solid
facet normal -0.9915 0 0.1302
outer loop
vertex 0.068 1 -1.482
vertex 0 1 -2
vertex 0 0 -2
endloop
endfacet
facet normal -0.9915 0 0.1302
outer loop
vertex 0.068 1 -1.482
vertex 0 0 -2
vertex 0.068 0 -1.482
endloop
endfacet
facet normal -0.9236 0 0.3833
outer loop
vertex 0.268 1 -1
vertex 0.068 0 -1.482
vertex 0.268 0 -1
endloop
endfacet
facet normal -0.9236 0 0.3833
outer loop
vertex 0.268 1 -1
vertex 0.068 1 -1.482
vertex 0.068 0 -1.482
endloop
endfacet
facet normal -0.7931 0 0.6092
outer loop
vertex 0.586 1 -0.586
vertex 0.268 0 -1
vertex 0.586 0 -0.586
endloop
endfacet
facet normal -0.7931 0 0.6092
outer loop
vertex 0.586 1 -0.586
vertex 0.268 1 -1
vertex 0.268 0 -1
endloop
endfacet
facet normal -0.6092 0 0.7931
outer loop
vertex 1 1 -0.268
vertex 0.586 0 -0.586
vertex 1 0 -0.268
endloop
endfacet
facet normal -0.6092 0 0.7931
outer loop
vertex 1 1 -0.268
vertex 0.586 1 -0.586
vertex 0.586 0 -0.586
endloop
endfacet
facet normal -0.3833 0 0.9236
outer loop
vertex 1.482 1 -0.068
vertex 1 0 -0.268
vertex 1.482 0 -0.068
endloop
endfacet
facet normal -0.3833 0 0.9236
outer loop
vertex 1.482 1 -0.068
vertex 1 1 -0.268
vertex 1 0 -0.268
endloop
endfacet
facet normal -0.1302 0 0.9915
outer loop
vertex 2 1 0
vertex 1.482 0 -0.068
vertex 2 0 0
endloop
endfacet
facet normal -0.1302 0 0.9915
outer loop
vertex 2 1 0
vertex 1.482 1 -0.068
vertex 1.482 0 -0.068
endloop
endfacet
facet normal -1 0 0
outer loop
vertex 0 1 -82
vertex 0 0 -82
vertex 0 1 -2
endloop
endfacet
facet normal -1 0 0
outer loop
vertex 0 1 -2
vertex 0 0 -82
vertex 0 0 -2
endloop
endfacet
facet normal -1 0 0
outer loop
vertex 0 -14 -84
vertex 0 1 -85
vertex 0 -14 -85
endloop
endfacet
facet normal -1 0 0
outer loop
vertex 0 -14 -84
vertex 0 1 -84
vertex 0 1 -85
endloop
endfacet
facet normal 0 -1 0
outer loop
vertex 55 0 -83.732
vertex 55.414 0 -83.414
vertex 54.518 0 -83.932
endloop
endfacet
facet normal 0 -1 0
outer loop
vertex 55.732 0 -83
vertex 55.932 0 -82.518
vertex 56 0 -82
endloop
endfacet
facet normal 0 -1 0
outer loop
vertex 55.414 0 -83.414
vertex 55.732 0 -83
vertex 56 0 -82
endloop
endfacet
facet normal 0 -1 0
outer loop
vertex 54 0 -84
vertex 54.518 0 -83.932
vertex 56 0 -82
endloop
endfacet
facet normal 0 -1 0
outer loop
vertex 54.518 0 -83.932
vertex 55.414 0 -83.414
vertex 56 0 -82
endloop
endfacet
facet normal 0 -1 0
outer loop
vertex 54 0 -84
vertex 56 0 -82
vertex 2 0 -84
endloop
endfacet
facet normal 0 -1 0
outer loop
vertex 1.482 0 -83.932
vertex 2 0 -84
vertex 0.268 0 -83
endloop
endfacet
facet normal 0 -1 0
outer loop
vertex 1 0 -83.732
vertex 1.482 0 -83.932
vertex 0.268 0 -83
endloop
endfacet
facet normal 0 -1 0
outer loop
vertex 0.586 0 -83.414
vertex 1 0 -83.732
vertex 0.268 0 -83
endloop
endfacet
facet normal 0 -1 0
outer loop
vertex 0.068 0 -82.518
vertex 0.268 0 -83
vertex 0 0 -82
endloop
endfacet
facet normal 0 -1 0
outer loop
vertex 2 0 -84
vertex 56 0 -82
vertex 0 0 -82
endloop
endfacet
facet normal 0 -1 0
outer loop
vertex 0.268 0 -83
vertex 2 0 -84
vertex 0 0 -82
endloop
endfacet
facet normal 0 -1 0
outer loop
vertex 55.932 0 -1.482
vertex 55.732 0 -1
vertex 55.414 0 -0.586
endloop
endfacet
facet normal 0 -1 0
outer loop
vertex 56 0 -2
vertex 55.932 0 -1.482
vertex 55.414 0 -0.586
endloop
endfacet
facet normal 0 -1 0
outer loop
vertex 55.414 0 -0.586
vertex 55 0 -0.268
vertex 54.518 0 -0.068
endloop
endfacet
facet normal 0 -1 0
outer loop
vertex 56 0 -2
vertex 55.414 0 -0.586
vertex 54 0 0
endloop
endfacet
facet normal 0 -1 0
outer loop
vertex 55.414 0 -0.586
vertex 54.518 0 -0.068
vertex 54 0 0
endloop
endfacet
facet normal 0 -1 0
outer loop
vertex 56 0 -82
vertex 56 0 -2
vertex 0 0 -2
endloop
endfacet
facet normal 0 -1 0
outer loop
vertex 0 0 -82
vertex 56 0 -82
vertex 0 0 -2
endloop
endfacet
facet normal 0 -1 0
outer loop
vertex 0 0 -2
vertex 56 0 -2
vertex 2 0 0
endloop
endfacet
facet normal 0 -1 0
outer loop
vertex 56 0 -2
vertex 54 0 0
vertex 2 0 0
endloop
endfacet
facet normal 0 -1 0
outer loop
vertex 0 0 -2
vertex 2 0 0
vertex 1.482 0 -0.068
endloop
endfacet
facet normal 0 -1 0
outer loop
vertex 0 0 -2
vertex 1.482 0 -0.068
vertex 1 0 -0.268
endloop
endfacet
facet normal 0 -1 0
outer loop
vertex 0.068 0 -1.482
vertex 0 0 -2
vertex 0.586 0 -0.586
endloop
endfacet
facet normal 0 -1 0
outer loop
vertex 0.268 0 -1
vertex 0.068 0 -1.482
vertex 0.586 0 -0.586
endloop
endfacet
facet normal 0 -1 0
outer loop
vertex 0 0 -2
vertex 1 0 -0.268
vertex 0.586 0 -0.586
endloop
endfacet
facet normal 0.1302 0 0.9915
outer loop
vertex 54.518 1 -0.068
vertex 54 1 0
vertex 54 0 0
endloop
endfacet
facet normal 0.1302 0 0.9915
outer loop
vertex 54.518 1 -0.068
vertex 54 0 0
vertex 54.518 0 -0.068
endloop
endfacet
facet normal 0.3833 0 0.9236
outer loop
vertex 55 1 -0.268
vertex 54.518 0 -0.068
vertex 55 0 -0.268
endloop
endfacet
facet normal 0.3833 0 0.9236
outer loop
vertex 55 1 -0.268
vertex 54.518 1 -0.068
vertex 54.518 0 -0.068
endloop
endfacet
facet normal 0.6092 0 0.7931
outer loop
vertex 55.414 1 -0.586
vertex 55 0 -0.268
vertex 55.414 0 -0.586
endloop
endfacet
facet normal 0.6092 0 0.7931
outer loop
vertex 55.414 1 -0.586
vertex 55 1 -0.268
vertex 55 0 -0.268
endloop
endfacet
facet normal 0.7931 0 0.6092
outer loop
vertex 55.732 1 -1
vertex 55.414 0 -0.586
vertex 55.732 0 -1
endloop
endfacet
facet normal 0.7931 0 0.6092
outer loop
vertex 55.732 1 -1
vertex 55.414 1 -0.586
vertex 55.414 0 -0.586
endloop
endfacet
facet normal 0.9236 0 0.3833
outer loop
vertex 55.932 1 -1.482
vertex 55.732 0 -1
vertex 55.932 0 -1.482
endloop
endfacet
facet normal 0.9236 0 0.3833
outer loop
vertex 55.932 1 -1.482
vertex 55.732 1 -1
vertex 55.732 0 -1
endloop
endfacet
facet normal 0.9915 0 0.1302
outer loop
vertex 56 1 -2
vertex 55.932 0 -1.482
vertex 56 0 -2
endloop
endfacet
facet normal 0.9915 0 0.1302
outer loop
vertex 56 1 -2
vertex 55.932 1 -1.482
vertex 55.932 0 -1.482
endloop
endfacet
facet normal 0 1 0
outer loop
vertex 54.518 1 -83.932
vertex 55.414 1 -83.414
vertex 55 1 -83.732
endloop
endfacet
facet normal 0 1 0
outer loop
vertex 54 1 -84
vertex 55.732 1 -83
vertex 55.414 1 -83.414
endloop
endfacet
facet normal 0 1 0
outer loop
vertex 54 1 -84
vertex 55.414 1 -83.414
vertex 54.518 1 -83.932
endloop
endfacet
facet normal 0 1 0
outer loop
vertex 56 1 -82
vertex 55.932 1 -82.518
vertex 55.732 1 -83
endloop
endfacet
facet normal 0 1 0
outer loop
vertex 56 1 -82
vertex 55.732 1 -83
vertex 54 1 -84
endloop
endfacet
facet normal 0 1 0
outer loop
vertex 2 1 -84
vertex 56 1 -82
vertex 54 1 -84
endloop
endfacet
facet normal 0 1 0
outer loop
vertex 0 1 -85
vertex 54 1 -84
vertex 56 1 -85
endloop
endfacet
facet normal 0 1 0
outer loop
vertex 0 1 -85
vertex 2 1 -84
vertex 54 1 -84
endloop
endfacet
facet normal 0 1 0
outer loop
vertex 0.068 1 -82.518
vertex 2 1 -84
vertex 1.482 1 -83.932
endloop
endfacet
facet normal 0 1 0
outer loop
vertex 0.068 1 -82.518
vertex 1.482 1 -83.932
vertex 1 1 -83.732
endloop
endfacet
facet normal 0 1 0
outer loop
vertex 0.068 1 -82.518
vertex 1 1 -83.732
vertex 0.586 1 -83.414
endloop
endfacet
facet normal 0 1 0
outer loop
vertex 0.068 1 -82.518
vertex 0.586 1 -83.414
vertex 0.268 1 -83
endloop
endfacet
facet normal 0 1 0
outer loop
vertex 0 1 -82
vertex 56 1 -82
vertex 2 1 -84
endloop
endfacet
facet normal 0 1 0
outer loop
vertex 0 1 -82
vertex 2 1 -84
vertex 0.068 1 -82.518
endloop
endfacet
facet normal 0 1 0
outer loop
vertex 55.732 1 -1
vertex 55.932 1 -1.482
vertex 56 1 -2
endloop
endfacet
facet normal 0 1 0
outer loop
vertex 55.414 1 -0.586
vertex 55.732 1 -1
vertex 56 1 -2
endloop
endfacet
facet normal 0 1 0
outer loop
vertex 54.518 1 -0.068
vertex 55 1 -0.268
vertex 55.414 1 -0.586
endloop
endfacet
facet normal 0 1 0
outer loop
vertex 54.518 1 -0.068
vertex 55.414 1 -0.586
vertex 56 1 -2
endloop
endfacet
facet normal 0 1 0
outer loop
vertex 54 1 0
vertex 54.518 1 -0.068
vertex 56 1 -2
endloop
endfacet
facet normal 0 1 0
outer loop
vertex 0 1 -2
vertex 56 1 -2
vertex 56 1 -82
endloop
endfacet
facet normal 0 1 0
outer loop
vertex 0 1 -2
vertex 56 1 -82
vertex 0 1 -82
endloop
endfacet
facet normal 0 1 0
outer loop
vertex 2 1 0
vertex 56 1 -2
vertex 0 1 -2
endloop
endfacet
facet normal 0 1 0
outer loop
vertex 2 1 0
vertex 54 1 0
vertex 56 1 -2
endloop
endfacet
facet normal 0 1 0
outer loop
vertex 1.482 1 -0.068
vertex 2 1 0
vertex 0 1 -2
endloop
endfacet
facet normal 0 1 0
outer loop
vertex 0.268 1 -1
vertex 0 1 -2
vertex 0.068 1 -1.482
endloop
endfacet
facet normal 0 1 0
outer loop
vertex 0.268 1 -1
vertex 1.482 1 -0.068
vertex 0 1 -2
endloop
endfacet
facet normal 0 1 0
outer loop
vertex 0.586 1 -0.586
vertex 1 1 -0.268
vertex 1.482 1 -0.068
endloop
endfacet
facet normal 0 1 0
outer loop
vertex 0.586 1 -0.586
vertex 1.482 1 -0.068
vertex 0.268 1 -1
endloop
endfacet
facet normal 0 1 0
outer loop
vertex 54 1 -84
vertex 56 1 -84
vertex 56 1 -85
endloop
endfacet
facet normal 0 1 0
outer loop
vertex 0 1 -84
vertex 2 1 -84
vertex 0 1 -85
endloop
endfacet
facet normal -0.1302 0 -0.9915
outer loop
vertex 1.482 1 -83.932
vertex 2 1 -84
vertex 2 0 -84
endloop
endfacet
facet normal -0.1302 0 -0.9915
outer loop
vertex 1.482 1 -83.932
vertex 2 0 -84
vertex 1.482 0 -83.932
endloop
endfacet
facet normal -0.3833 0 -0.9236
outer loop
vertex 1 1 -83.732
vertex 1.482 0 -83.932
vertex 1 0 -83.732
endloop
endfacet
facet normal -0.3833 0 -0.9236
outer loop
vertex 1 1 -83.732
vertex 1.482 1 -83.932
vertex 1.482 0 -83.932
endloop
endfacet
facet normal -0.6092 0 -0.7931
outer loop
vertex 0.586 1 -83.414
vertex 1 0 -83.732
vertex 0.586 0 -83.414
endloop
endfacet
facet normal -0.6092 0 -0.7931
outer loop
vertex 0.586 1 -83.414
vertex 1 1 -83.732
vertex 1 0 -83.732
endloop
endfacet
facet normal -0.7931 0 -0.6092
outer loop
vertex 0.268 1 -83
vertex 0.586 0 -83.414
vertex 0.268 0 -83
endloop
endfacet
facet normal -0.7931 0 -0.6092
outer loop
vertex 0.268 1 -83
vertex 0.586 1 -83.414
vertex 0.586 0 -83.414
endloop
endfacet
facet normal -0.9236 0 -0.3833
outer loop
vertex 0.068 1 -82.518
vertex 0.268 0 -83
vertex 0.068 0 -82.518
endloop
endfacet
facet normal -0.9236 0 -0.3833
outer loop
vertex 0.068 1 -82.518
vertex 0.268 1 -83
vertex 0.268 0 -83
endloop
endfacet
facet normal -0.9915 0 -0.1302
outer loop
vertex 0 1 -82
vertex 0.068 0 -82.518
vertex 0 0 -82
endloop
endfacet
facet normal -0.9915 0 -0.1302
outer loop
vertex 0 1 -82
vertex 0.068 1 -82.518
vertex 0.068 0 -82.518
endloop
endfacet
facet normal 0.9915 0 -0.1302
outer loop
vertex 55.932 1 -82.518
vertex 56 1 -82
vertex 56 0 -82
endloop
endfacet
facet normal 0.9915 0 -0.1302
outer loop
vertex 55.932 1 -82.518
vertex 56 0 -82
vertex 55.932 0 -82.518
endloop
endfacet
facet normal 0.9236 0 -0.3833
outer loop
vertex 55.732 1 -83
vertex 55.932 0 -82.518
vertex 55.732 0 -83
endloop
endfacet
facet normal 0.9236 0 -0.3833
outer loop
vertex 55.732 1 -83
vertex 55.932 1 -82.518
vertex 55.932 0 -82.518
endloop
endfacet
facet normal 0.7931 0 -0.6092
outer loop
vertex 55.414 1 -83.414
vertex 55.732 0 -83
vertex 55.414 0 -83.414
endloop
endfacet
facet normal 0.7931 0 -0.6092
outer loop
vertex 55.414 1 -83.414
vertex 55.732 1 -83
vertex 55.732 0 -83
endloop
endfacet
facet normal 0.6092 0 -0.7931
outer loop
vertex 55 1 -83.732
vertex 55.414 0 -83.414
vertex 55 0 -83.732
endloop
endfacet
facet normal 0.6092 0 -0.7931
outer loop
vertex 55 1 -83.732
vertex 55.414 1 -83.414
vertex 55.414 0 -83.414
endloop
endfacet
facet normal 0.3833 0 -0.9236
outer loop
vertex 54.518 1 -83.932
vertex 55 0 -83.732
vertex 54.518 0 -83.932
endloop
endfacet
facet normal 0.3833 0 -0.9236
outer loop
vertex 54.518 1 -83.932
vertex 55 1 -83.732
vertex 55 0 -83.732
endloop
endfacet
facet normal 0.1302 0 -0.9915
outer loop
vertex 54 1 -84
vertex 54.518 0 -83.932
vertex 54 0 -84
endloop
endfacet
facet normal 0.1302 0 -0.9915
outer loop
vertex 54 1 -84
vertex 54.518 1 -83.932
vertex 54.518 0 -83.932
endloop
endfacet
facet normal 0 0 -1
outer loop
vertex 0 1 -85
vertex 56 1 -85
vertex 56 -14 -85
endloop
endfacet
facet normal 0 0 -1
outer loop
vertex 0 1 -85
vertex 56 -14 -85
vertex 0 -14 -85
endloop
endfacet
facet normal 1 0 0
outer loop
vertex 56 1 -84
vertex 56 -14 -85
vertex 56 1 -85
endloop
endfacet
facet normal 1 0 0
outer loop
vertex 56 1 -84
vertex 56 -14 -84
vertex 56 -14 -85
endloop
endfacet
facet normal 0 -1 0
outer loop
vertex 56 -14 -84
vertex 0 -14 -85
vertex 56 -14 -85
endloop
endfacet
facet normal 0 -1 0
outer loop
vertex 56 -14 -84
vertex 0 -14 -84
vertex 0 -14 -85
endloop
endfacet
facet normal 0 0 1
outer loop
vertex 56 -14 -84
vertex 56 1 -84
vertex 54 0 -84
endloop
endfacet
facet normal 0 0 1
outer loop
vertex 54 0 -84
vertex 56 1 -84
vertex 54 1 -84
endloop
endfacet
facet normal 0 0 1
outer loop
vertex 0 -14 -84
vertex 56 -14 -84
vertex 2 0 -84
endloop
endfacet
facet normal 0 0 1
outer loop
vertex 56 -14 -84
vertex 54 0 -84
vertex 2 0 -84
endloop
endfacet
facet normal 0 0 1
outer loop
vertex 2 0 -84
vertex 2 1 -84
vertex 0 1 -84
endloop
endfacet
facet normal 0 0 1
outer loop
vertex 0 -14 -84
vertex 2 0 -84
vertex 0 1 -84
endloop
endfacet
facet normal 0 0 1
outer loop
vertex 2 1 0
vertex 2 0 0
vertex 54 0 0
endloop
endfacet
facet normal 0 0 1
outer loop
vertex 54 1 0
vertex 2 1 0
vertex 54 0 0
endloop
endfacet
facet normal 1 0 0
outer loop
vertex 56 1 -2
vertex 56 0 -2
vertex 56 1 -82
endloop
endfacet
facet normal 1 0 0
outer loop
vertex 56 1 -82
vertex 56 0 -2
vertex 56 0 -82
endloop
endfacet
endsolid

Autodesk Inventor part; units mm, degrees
ref_plane "YZ Plane" through (0, 0, 0) normal (1, 0, 0) x (0, 1, 0)
ref_plane "XZ Plane" through (0, 0, 0) normal (0, 1, 0) x (-1, 0, 0)
sketch "Sketch1" plane through (0, 0, 0) normal (0, 1, 0) x (-1, 0, 0)
  line L0 (0, 0) -> (-56, 0)
  line L1 (-56, 0) -> (-56, -84)
  line L2 (-56, -84) -> (0, -84)
  line L3 (0, -84) -> (0, 0)
  point P0 (-28, -84)
  dimension "d0" = 56
  dimension "d1" = 84
extrude "Extrusion1" add sketch "Sketch1" along normal blind 1
fillet "Fillet1" radius 2 1 edges at (0, 0.5, 0)
fillet "Fillet2" radius 2 1 edges at (56, 0.5, 0)
fillet "Fillet3" radius 2 1 edges at (56, 0.5, -84)
fillet "Fillet4" radius 2 1 edges at (0, 0.5, -84)
sketch "Sketch2" plane through (0, 1, 0) normal (0, 1, 0) x (1, 0, 0)
  point P0 (0, 0)
ref_plane "Work Plane1" through (54, 0, -84) normal (0, 0, -1) x (-1, 0, 0)
sketch "Sketch3" plane through (54, 0, -84) normal (0, 0, -1) x (-1, 0, 0)
  line L0 (-2, 1) -> (0, 1) projected
  line L1 (-2, 1) -> (54, 1)
  line L2 (54, 1) -> (54, -14)
  line L3 (54, -14) -> (-2, -14)
  line L4 (-2, -14) -> (-2, 1)
  point P0 (54, 0)
  dimension "d9" = 0
  dimension "d10" = 15
extrude "Extrusion2" add sketch "Sketch3" along normal blind 1
properties part number "cover"
